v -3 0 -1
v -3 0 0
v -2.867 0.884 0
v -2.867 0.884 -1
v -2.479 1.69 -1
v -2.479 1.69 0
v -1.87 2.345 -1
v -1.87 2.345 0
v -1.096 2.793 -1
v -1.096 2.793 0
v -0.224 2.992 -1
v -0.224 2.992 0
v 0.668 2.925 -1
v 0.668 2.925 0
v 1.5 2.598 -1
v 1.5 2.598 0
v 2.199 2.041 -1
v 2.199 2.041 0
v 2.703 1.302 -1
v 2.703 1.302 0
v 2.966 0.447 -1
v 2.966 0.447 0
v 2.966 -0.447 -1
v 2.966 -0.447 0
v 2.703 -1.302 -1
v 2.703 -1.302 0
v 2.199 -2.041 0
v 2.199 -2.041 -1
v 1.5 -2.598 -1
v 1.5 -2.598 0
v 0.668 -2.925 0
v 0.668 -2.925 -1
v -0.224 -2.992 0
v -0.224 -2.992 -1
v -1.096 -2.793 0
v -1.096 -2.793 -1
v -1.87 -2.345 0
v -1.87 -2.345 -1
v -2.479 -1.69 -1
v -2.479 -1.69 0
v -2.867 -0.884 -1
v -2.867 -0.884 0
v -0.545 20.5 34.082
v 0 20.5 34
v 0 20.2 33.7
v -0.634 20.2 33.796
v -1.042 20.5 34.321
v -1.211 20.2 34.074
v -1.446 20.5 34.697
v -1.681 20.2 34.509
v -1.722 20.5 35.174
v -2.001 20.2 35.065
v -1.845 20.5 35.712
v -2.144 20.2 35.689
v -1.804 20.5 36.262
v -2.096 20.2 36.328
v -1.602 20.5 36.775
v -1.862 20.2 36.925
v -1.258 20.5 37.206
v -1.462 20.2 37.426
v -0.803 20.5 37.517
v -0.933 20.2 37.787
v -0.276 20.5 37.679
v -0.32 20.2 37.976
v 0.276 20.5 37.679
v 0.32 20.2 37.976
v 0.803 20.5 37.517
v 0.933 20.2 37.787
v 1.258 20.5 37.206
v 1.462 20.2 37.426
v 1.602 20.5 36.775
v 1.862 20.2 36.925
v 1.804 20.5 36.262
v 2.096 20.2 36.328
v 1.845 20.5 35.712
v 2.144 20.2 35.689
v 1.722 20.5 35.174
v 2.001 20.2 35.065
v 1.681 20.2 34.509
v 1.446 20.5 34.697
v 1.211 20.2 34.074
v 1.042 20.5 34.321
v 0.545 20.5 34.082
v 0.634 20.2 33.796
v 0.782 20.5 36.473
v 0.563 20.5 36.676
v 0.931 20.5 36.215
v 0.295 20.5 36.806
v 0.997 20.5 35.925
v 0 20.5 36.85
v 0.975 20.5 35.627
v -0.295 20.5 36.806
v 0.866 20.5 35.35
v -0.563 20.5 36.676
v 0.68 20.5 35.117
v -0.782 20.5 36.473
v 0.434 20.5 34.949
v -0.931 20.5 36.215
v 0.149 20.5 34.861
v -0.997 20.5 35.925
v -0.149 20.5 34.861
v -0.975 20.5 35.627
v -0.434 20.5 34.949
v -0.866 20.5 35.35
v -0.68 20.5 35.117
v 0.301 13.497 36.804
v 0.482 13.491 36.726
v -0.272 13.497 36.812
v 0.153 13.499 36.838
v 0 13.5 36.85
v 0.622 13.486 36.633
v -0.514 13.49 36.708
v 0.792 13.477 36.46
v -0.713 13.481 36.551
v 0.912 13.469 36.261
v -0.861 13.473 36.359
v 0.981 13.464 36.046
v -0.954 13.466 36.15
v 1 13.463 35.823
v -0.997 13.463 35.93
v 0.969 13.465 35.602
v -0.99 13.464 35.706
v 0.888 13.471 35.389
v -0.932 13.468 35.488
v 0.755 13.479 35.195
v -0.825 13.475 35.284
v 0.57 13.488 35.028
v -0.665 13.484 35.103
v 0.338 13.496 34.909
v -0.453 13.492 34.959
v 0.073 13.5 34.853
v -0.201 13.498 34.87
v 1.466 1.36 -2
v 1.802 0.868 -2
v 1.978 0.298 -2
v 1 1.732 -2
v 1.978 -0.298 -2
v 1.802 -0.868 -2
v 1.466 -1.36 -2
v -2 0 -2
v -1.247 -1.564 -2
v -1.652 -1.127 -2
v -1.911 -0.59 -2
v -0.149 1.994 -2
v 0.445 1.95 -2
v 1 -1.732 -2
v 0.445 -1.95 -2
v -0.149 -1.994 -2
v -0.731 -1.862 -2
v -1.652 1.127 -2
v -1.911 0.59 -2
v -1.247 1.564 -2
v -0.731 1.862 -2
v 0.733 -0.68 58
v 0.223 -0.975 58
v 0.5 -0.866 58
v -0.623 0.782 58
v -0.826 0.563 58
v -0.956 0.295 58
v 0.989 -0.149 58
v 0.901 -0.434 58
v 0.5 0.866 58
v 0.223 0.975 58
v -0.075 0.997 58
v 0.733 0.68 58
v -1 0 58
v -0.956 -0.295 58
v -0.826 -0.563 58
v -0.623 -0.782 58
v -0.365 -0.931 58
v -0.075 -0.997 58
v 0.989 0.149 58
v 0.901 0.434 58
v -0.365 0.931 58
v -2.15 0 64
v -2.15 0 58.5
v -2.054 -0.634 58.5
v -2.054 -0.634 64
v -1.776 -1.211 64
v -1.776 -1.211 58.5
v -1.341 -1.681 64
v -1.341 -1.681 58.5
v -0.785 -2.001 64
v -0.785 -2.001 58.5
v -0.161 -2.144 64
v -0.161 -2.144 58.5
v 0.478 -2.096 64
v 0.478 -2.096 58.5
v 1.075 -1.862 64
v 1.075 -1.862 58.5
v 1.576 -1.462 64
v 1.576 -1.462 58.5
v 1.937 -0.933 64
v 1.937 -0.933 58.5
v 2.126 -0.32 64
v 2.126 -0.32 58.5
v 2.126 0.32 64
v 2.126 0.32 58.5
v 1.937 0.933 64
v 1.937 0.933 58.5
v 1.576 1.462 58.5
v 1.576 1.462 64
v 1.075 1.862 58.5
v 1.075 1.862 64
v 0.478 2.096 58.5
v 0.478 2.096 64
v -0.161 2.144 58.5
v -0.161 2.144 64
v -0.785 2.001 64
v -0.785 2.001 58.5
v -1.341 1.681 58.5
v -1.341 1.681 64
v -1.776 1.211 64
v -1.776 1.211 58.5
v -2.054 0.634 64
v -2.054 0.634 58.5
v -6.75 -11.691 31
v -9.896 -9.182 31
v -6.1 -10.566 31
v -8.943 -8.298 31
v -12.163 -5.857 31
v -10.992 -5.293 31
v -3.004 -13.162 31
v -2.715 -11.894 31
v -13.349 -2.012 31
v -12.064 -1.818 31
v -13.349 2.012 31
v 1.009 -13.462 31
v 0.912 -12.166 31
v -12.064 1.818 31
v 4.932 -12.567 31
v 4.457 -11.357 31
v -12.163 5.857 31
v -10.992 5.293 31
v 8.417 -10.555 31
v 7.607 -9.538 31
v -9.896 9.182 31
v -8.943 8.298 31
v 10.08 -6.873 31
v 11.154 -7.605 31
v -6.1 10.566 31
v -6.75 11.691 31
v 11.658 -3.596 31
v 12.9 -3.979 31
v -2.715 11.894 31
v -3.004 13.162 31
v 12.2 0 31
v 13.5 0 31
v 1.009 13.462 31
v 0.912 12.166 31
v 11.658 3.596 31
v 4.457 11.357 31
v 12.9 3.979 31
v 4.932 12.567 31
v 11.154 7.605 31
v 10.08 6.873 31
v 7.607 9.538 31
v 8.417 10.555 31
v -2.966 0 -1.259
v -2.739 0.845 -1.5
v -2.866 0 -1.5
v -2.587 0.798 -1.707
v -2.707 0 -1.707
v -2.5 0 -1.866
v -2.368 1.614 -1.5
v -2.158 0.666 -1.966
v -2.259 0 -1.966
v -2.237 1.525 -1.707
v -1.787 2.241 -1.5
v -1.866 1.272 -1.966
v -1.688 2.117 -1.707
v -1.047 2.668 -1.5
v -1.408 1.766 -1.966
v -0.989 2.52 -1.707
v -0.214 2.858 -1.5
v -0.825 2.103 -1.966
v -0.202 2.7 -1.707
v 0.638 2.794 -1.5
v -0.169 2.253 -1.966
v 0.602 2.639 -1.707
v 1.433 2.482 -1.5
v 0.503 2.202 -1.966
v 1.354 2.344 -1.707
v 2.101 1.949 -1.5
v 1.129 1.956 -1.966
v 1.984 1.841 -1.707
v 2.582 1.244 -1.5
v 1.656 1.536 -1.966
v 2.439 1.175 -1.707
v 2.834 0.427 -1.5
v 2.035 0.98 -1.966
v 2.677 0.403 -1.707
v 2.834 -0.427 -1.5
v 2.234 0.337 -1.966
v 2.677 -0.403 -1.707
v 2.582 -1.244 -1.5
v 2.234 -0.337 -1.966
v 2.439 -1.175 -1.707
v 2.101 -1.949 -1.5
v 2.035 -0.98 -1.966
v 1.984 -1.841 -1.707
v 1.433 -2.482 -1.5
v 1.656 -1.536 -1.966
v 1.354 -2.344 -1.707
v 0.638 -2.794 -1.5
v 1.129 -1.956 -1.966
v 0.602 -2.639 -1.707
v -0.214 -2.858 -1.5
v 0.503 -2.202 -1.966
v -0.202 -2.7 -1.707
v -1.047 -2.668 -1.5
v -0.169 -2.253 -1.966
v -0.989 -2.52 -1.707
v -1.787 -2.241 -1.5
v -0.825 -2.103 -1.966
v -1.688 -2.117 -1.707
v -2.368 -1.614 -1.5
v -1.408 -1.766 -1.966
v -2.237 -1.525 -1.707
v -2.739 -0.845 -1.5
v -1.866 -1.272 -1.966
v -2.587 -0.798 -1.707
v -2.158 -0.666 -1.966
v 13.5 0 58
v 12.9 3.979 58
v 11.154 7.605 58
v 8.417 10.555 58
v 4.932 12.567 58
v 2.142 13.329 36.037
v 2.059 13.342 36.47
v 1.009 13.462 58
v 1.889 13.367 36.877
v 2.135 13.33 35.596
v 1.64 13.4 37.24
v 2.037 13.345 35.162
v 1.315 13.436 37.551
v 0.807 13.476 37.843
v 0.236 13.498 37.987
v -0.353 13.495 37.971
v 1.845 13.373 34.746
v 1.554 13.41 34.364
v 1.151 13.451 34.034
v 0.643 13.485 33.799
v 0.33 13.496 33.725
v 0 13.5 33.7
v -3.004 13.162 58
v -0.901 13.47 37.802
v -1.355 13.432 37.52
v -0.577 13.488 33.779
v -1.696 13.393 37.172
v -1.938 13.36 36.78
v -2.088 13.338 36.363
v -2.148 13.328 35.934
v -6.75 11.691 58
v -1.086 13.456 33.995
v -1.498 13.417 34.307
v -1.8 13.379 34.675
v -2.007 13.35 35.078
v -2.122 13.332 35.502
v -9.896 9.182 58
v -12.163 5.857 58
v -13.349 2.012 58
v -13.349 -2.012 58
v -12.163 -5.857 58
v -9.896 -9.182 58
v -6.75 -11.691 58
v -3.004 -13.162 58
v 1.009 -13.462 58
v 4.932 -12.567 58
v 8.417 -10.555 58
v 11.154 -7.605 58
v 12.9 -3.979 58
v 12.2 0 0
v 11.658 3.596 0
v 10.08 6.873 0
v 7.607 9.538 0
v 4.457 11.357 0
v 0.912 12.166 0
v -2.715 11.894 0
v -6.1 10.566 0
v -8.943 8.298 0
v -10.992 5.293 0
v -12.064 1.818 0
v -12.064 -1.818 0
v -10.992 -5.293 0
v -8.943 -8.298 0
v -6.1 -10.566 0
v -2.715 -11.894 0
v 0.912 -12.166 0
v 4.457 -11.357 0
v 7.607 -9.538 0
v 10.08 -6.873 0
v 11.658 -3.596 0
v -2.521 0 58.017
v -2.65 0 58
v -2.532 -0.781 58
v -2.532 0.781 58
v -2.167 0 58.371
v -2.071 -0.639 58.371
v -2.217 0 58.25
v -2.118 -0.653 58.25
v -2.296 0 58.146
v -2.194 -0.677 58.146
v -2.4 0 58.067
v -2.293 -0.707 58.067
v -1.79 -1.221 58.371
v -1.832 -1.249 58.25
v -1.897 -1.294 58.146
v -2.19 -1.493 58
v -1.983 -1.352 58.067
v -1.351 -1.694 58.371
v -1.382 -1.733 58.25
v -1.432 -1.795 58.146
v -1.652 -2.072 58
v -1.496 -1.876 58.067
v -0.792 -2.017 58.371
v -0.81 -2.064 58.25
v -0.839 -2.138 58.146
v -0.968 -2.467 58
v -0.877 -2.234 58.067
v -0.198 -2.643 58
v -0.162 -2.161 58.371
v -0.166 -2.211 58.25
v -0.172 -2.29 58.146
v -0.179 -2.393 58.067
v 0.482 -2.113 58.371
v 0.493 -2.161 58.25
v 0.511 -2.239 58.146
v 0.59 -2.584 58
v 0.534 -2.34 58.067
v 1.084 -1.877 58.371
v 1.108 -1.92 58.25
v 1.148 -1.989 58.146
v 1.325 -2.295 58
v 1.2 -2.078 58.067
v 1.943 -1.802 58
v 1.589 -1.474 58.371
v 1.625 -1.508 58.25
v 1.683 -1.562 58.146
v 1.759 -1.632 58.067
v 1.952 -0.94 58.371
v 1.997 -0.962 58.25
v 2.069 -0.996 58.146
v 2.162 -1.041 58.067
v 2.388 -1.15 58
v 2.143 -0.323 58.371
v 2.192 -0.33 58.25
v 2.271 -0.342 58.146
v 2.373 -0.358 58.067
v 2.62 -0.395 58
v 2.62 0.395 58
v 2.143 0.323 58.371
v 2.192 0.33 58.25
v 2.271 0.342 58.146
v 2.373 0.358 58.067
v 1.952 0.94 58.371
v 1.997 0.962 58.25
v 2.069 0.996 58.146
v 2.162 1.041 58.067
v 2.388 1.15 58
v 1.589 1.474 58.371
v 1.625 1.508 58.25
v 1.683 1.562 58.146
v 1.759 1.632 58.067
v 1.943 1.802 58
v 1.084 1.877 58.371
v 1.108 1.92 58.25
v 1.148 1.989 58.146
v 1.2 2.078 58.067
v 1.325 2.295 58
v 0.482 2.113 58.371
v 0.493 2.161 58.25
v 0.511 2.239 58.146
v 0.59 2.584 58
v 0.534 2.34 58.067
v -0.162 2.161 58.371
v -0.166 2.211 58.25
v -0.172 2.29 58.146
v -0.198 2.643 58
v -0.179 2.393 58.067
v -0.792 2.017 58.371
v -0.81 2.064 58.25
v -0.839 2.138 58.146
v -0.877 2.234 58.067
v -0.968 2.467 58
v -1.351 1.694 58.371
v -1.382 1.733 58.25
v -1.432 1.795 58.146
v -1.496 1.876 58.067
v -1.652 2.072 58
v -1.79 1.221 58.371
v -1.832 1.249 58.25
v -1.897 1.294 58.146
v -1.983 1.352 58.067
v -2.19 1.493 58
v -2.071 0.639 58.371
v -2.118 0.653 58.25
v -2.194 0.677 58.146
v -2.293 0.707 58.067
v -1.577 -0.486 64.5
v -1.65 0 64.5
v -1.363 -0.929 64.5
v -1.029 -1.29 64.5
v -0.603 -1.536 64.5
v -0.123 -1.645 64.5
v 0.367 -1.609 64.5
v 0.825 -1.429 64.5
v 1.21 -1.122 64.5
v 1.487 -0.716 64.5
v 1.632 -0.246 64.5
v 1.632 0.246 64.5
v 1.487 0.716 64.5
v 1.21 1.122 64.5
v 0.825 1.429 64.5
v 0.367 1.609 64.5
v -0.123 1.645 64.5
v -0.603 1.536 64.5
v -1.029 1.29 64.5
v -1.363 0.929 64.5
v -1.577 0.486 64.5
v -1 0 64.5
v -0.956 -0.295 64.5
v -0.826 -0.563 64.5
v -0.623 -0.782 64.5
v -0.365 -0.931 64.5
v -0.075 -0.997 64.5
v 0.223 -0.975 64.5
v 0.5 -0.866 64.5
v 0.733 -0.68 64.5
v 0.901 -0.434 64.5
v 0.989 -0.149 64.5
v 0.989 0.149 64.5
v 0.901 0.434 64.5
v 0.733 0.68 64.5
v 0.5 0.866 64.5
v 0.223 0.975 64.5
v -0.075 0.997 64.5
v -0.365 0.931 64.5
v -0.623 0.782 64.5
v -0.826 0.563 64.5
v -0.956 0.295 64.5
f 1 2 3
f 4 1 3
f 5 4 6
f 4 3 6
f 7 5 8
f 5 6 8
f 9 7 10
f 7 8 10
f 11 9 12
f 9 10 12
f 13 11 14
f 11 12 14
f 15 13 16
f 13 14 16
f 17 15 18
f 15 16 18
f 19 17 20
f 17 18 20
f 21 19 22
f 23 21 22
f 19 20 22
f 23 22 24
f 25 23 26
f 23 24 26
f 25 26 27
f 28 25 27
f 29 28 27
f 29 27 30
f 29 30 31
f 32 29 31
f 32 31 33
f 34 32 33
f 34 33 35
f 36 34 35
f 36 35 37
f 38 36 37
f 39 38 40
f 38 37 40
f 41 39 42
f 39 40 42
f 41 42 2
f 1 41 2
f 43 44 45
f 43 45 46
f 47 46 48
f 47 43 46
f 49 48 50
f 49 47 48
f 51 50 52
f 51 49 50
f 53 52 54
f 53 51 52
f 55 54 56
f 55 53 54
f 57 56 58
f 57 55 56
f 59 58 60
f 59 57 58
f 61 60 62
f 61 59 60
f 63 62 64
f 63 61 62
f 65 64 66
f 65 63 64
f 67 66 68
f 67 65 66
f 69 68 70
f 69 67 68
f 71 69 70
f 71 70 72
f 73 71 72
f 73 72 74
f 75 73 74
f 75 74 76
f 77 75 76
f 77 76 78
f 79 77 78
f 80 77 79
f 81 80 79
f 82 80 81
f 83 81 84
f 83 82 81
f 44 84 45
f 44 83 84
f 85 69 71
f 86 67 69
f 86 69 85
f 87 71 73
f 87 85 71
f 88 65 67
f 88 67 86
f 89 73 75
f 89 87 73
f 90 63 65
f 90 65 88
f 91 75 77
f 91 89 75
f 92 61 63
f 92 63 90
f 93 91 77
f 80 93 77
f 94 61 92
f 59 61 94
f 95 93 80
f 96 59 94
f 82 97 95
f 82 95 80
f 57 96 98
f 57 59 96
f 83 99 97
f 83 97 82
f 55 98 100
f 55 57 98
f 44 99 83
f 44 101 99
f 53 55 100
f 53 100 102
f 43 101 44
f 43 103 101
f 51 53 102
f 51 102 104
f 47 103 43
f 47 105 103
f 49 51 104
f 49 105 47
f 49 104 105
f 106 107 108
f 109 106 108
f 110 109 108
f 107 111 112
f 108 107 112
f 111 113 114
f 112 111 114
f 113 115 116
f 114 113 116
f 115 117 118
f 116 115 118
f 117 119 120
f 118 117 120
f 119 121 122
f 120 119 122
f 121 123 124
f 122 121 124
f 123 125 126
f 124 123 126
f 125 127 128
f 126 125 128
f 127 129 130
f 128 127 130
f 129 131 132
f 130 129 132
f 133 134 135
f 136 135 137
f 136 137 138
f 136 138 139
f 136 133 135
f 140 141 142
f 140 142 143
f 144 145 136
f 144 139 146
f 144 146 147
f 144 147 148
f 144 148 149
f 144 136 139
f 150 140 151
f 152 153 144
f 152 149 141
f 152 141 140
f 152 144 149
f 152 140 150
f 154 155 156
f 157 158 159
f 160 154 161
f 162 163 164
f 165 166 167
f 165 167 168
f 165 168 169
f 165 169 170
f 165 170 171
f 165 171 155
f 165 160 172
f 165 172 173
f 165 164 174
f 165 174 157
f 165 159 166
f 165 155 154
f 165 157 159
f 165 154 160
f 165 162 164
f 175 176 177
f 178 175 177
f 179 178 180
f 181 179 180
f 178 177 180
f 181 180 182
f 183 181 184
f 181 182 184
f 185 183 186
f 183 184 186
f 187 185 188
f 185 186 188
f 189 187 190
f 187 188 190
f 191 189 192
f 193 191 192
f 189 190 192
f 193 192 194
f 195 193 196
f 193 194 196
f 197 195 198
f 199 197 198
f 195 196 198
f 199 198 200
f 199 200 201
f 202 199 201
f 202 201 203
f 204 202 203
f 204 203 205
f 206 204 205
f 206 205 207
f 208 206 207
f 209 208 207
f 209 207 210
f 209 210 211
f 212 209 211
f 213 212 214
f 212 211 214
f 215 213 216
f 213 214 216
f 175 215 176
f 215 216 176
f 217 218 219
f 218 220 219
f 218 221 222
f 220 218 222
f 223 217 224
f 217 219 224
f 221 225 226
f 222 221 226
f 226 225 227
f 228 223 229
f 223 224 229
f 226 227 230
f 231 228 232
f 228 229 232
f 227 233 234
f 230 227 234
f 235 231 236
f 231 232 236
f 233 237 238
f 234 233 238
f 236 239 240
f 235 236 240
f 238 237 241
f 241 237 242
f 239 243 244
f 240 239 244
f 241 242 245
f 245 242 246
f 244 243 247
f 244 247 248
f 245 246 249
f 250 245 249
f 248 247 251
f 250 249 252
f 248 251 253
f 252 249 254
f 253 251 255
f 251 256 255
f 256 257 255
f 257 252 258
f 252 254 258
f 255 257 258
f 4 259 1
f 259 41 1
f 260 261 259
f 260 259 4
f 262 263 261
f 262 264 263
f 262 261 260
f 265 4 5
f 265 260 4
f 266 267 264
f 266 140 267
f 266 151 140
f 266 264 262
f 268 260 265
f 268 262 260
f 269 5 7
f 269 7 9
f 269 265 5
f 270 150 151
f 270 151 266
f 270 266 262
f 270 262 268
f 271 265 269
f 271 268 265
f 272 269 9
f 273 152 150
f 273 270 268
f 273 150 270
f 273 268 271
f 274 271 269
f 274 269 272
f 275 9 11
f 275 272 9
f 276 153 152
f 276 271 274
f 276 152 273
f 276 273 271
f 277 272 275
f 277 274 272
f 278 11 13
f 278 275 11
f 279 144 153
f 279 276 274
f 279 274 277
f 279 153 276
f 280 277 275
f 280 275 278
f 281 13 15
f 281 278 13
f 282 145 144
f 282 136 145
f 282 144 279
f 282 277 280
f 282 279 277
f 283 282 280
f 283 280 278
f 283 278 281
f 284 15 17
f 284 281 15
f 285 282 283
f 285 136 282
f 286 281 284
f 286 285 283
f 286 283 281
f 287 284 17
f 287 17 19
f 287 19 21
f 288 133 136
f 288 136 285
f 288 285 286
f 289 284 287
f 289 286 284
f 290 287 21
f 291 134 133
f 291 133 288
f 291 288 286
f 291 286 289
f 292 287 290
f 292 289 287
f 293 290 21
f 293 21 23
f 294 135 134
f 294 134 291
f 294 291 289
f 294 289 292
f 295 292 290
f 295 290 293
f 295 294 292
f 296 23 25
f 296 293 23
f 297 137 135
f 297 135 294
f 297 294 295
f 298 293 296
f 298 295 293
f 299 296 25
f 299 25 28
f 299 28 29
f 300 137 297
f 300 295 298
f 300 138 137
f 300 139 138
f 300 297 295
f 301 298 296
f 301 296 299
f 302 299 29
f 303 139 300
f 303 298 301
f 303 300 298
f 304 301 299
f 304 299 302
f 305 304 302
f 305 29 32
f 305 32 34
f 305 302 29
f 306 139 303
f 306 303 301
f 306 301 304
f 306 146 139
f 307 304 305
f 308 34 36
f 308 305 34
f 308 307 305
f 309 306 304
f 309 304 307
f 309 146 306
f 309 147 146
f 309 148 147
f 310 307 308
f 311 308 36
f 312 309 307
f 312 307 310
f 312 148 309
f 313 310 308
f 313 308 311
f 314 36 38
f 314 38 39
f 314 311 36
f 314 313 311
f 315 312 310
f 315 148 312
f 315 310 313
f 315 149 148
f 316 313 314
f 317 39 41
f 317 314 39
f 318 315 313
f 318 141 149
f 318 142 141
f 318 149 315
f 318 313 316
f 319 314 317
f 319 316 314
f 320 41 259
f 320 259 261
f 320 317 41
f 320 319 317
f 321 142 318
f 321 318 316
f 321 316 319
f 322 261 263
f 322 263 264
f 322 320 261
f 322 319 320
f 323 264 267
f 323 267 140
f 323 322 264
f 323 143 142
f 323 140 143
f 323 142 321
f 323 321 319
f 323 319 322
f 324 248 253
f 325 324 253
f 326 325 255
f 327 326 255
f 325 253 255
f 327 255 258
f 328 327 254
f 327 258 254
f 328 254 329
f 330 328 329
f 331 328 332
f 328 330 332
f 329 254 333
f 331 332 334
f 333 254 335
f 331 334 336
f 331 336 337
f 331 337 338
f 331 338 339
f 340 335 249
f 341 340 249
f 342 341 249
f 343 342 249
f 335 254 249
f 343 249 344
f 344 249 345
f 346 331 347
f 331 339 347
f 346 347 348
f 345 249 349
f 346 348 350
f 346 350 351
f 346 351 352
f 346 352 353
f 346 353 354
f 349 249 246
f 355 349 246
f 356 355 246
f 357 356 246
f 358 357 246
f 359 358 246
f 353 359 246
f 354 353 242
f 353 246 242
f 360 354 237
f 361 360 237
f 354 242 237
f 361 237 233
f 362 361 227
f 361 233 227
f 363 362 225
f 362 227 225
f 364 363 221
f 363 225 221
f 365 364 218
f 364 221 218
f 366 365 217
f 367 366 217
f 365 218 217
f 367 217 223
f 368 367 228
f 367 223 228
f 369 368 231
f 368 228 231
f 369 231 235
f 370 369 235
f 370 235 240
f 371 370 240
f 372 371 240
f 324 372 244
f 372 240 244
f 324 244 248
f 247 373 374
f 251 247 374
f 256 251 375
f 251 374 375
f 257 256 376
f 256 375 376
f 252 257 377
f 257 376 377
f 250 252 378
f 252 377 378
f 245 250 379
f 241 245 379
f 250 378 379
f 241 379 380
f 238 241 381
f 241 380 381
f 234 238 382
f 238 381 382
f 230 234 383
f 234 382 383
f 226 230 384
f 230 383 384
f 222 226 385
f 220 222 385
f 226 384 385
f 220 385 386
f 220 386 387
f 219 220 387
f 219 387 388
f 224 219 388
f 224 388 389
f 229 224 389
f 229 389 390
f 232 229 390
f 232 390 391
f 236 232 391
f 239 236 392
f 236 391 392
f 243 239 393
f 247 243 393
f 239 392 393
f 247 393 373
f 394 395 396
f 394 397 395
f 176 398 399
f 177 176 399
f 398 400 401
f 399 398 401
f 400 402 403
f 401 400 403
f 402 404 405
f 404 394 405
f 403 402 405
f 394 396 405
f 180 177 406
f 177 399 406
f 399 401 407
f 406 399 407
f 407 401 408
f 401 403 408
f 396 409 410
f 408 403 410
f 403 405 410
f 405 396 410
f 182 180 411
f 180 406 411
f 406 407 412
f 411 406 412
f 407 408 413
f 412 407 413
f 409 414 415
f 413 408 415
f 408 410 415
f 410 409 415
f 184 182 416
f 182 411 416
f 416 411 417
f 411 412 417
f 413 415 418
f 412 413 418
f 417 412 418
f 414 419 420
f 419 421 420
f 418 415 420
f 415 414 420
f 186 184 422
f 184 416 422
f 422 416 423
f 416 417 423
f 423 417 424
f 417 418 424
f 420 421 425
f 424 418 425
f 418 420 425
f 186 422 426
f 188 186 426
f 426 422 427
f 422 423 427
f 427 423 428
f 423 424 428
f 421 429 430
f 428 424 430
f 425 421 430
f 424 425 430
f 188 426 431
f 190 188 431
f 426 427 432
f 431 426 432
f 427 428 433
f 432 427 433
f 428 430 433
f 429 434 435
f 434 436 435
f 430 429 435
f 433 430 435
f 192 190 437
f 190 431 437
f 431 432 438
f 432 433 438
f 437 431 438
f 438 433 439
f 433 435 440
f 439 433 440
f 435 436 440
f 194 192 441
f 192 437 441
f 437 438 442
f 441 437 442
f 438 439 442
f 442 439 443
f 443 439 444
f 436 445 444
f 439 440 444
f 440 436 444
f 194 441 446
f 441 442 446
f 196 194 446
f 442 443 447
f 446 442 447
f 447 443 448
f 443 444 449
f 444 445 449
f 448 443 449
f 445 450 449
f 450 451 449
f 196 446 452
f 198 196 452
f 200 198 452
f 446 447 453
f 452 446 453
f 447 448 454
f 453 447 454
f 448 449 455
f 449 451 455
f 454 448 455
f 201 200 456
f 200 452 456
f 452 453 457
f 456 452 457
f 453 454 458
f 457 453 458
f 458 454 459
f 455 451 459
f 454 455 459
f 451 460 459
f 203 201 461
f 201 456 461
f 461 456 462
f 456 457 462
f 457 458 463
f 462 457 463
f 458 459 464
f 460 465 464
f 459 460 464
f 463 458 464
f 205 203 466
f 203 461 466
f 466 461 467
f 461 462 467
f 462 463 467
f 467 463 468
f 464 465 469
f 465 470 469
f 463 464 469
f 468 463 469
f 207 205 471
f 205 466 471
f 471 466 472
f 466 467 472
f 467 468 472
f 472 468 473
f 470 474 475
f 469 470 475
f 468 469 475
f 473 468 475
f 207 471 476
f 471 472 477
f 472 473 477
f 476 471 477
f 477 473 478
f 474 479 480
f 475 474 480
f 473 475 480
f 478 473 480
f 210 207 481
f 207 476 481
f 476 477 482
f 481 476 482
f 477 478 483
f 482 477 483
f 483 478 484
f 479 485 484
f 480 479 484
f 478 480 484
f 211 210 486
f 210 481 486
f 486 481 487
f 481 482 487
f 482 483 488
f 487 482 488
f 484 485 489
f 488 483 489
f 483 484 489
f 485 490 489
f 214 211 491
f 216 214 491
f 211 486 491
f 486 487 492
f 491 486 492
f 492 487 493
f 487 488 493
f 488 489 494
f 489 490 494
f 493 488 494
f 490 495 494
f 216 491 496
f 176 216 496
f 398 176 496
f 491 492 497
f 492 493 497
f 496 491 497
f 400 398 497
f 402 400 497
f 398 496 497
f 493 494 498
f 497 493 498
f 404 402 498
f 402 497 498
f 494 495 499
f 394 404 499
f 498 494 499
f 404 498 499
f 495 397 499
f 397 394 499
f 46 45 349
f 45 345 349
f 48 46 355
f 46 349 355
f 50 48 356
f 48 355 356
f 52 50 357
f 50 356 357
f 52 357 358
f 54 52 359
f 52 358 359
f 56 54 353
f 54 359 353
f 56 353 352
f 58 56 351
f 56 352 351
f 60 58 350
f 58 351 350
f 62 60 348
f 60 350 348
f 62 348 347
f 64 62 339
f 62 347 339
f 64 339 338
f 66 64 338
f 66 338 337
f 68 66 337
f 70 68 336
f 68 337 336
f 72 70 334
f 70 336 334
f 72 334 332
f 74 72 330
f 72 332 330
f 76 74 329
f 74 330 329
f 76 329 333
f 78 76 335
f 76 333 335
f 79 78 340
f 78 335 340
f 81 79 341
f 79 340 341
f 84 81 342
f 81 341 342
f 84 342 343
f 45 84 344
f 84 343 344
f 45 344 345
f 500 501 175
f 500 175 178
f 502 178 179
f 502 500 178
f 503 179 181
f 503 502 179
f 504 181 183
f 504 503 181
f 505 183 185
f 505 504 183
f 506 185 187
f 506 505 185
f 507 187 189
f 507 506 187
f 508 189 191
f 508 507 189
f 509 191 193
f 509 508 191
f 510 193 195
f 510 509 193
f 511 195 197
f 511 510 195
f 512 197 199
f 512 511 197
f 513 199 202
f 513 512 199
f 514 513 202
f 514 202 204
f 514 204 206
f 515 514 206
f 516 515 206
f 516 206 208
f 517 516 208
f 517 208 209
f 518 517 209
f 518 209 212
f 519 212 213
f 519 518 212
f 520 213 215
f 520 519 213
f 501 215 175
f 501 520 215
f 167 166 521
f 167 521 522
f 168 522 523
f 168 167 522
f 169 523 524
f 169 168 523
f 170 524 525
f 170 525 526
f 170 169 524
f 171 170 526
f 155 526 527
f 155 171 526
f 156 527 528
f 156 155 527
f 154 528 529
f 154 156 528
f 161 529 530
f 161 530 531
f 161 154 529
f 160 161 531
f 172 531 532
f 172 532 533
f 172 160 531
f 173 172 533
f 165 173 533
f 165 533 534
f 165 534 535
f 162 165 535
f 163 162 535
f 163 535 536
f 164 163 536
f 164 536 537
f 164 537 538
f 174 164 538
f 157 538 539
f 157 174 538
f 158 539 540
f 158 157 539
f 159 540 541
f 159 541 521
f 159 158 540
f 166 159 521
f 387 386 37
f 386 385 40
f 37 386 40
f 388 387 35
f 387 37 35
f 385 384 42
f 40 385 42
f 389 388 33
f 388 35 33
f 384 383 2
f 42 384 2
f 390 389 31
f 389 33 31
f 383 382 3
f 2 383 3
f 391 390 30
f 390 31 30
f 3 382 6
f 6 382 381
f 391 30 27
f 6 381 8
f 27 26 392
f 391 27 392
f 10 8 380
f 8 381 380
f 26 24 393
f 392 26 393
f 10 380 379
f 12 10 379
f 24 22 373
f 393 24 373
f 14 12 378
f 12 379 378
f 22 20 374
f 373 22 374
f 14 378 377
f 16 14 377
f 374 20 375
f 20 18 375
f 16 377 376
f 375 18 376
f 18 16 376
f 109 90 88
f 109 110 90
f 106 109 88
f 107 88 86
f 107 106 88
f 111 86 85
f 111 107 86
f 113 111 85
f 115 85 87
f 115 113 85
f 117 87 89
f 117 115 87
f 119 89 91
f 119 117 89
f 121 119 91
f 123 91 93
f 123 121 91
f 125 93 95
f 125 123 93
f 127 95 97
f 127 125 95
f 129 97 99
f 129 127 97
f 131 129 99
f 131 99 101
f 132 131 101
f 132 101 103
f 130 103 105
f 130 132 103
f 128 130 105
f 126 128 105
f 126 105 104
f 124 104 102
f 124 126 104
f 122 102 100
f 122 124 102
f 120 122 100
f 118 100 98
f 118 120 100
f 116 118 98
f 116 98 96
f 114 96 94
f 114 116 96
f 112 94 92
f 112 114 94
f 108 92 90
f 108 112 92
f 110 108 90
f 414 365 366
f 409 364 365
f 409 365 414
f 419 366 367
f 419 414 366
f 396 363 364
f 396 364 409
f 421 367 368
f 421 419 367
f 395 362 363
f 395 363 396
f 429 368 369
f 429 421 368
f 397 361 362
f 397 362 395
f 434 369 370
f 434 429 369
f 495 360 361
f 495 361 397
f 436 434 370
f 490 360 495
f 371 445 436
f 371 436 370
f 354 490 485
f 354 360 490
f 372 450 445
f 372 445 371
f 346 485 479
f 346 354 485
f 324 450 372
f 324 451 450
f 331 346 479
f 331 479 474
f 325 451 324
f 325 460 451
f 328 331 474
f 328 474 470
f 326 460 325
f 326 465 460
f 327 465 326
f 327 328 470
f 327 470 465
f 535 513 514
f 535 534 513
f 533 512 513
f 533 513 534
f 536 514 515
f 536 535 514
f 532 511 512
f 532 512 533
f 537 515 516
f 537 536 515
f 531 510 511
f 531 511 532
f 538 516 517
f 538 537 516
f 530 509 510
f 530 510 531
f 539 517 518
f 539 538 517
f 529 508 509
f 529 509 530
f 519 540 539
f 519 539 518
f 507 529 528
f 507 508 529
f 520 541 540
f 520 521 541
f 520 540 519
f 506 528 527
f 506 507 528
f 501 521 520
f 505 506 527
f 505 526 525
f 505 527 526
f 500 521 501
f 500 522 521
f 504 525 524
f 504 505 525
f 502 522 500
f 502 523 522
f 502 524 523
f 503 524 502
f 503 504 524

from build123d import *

# Parameters (mm, degrees)
CROQUIS1_R                               = 12.2
SALIENTE_EXTRUIR1_DEPTH                  = 31
CROQUIS2_R                               = 13.5
SALIENTE_EXTRUIR2_DEPTH                  = 27
CROQUIS3_R                               = 2.15
CROQUIS3_R_2                             = 1
SALIENTE_EXTRUIR3_DEPTH                  = 6.5
CHAFL_N2_SIZE                            = 0.5
REDONDEO1_R                              = 0.5
CROQUIS5_R                               = 2.15
CROQUIS5_R_2                             = 1
SALIENTE_EXTRUIR4_DEPTH                  = 7
SALIENTE_EXTRUIR4_DIRECTION_2_REACH      = 73.214
SALIENTE_EXTRUIR4_DIRECTION_2_END_RADIUS = 13.5
CHAFL_N3_SIZE                            = 0.3
CROQUIS6_R                               = 3
SALIENTE_EXTRUIR5_DEPTH                  = 2
REDONDEO2_R                              = 1


with BuildPart() as part:
    # Croquis1 → Saliente-Extruir1 (new body)
    with BuildSketch(Plane.XY):
        Circle(CROQUIS1_R)
    extrude(amount=SALIENTE_EXTRUIR1_DEPTH)

    # Croquis2 → Saliente-Extruir2 (add)
    with BuildSketch(Plane.XY.offset(31)):
        Circle(CROQUIS2_R)
    extrude(amount=SALIENTE_EXTRUIR2_DEPTH)

    # Croquis3 → Saliente-Extruir3 (add)
    with BuildSketch(Plane.XY.offset(58)):
        with Locations(Location((0, 0, 0), (0, 0, 180))):
            Circle(CROQUIS3_R)
        with Locations(Location((0, 0, 0), (0, 0, 180))):
            Circle(CROQUIS3_R_2, mode=Mode.SUBTRACT)
    extrude(amount=SALIENTE_EXTRUIR3_DEPTH)

    # Chaflán2
    chafl_n2_edges = [part.edges().sort_by_distance(p)[0] for p in [
        (2.15, 0, 64.5),
    ]]
    chamfer(chafl_n2_edges, length=CHAFL_N2_SIZE)

    # Redondeo1
    redondeo1_edges = [part.edges().sort_by_distance(p)[0] for p in [
        (2.15, 0, 58),
    ]]
    fillet(redondeo1_edges, radius=REDONDEO1_R)

    # Croquis5 → Saliente-Extruir4 (add)
    with BuildSketch(Plane(origin=(0, 13.5, 0), x_dir=(1, 0, 0), z_dir=(0, 1, 0))):
        with Locations(Location((0, -35.85, 0), (0, 0, 90))):
            Circle(CROQUIS5_R)
        with Locations(Location((0, -35.85, 0), (0, 0, 270))):
            Circle(CROQUIS5_R_2, mode=Mode.SUBTRACT)
    extrude(amount=SALIENTE_EXTRUIR4_DEPTH)

    # Saliente-Extruir4 direction 2: up to this cylinder (the profile starts outside it)
    saliente_extruir4_direction_2_end = Plane(origin=(0, 0, 37.939189), z_dir=(0, 0, -1)) * Cylinder(SALIENTE_EXTRUIR4_DIRECTION_2_END_RADIUS, 174.428, mode=Mode.PRIVATE)
    # Croquis5 → Saliente-Extruir4 direction 2 (add, up to the surface)
    with BuildSketch(Plane(origin=(0, 13.5, 0), x_dir=(1, 0, 0), z_dir=(0, 1, 0)), mode=Mode.PRIVATE) as saliente_extruir4_direction_2_sk1:
        with Locations(Location((0, -35.85, 0), (0, 0, 90))):
            Circle(CROQUIS5_R)
        with Locations(Location((0, -35.85, 0), (0, 0, 270))):
            Circle(CROQUIS5_R_2, mode=Mode.SUBTRACT)
    saliente_extruir4_direction_2_tool1 = extrude(saliente_extruir4_direction_2_sk1.sketch, amount=-SALIENTE_EXTRUIR4_DIRECTION_2_REACH, mode=Mode.PRIVATE) - saliente_extruir4_direction_2_end
    add(saliente_extruir4_direction_2_tool1.solids().sort_by_distance((0, 13.5, 37.939189))[0])
    add(saliente_extruir4_direction_2_tool1.solids().sort_by_distance((0, 13.5, 37.939189))[1])

    # Chaflán3
    chafl_n3_edges = [part.edges().sort_by_distance(p)[0] for p in [
        (0, 20.5, 38),
    ]]
    chamfer(chafl_n3_edges, length=CHAFL_N3_SIZE)

    # Croquis6 → Saliente-Extruir5 (add)
    with BuildSketch(Plane(origin=(0, 0, 0), x_dir=(-1, 0, 0), z_dir=(0, 0, -1))):
        Circle(CROQUIS6_R)
    extrude(amount=SALIENTE_EXTRUIR5_DEPTH)

    # Redondeo2
    redondeo2_edges = [part.edges().sort_by_distance(p)[0] for p in [
        (3, 0, -2),
    ]]
    fillet(redondeo2_edges, radius=REDONDEO2_R)


solid = part.part
